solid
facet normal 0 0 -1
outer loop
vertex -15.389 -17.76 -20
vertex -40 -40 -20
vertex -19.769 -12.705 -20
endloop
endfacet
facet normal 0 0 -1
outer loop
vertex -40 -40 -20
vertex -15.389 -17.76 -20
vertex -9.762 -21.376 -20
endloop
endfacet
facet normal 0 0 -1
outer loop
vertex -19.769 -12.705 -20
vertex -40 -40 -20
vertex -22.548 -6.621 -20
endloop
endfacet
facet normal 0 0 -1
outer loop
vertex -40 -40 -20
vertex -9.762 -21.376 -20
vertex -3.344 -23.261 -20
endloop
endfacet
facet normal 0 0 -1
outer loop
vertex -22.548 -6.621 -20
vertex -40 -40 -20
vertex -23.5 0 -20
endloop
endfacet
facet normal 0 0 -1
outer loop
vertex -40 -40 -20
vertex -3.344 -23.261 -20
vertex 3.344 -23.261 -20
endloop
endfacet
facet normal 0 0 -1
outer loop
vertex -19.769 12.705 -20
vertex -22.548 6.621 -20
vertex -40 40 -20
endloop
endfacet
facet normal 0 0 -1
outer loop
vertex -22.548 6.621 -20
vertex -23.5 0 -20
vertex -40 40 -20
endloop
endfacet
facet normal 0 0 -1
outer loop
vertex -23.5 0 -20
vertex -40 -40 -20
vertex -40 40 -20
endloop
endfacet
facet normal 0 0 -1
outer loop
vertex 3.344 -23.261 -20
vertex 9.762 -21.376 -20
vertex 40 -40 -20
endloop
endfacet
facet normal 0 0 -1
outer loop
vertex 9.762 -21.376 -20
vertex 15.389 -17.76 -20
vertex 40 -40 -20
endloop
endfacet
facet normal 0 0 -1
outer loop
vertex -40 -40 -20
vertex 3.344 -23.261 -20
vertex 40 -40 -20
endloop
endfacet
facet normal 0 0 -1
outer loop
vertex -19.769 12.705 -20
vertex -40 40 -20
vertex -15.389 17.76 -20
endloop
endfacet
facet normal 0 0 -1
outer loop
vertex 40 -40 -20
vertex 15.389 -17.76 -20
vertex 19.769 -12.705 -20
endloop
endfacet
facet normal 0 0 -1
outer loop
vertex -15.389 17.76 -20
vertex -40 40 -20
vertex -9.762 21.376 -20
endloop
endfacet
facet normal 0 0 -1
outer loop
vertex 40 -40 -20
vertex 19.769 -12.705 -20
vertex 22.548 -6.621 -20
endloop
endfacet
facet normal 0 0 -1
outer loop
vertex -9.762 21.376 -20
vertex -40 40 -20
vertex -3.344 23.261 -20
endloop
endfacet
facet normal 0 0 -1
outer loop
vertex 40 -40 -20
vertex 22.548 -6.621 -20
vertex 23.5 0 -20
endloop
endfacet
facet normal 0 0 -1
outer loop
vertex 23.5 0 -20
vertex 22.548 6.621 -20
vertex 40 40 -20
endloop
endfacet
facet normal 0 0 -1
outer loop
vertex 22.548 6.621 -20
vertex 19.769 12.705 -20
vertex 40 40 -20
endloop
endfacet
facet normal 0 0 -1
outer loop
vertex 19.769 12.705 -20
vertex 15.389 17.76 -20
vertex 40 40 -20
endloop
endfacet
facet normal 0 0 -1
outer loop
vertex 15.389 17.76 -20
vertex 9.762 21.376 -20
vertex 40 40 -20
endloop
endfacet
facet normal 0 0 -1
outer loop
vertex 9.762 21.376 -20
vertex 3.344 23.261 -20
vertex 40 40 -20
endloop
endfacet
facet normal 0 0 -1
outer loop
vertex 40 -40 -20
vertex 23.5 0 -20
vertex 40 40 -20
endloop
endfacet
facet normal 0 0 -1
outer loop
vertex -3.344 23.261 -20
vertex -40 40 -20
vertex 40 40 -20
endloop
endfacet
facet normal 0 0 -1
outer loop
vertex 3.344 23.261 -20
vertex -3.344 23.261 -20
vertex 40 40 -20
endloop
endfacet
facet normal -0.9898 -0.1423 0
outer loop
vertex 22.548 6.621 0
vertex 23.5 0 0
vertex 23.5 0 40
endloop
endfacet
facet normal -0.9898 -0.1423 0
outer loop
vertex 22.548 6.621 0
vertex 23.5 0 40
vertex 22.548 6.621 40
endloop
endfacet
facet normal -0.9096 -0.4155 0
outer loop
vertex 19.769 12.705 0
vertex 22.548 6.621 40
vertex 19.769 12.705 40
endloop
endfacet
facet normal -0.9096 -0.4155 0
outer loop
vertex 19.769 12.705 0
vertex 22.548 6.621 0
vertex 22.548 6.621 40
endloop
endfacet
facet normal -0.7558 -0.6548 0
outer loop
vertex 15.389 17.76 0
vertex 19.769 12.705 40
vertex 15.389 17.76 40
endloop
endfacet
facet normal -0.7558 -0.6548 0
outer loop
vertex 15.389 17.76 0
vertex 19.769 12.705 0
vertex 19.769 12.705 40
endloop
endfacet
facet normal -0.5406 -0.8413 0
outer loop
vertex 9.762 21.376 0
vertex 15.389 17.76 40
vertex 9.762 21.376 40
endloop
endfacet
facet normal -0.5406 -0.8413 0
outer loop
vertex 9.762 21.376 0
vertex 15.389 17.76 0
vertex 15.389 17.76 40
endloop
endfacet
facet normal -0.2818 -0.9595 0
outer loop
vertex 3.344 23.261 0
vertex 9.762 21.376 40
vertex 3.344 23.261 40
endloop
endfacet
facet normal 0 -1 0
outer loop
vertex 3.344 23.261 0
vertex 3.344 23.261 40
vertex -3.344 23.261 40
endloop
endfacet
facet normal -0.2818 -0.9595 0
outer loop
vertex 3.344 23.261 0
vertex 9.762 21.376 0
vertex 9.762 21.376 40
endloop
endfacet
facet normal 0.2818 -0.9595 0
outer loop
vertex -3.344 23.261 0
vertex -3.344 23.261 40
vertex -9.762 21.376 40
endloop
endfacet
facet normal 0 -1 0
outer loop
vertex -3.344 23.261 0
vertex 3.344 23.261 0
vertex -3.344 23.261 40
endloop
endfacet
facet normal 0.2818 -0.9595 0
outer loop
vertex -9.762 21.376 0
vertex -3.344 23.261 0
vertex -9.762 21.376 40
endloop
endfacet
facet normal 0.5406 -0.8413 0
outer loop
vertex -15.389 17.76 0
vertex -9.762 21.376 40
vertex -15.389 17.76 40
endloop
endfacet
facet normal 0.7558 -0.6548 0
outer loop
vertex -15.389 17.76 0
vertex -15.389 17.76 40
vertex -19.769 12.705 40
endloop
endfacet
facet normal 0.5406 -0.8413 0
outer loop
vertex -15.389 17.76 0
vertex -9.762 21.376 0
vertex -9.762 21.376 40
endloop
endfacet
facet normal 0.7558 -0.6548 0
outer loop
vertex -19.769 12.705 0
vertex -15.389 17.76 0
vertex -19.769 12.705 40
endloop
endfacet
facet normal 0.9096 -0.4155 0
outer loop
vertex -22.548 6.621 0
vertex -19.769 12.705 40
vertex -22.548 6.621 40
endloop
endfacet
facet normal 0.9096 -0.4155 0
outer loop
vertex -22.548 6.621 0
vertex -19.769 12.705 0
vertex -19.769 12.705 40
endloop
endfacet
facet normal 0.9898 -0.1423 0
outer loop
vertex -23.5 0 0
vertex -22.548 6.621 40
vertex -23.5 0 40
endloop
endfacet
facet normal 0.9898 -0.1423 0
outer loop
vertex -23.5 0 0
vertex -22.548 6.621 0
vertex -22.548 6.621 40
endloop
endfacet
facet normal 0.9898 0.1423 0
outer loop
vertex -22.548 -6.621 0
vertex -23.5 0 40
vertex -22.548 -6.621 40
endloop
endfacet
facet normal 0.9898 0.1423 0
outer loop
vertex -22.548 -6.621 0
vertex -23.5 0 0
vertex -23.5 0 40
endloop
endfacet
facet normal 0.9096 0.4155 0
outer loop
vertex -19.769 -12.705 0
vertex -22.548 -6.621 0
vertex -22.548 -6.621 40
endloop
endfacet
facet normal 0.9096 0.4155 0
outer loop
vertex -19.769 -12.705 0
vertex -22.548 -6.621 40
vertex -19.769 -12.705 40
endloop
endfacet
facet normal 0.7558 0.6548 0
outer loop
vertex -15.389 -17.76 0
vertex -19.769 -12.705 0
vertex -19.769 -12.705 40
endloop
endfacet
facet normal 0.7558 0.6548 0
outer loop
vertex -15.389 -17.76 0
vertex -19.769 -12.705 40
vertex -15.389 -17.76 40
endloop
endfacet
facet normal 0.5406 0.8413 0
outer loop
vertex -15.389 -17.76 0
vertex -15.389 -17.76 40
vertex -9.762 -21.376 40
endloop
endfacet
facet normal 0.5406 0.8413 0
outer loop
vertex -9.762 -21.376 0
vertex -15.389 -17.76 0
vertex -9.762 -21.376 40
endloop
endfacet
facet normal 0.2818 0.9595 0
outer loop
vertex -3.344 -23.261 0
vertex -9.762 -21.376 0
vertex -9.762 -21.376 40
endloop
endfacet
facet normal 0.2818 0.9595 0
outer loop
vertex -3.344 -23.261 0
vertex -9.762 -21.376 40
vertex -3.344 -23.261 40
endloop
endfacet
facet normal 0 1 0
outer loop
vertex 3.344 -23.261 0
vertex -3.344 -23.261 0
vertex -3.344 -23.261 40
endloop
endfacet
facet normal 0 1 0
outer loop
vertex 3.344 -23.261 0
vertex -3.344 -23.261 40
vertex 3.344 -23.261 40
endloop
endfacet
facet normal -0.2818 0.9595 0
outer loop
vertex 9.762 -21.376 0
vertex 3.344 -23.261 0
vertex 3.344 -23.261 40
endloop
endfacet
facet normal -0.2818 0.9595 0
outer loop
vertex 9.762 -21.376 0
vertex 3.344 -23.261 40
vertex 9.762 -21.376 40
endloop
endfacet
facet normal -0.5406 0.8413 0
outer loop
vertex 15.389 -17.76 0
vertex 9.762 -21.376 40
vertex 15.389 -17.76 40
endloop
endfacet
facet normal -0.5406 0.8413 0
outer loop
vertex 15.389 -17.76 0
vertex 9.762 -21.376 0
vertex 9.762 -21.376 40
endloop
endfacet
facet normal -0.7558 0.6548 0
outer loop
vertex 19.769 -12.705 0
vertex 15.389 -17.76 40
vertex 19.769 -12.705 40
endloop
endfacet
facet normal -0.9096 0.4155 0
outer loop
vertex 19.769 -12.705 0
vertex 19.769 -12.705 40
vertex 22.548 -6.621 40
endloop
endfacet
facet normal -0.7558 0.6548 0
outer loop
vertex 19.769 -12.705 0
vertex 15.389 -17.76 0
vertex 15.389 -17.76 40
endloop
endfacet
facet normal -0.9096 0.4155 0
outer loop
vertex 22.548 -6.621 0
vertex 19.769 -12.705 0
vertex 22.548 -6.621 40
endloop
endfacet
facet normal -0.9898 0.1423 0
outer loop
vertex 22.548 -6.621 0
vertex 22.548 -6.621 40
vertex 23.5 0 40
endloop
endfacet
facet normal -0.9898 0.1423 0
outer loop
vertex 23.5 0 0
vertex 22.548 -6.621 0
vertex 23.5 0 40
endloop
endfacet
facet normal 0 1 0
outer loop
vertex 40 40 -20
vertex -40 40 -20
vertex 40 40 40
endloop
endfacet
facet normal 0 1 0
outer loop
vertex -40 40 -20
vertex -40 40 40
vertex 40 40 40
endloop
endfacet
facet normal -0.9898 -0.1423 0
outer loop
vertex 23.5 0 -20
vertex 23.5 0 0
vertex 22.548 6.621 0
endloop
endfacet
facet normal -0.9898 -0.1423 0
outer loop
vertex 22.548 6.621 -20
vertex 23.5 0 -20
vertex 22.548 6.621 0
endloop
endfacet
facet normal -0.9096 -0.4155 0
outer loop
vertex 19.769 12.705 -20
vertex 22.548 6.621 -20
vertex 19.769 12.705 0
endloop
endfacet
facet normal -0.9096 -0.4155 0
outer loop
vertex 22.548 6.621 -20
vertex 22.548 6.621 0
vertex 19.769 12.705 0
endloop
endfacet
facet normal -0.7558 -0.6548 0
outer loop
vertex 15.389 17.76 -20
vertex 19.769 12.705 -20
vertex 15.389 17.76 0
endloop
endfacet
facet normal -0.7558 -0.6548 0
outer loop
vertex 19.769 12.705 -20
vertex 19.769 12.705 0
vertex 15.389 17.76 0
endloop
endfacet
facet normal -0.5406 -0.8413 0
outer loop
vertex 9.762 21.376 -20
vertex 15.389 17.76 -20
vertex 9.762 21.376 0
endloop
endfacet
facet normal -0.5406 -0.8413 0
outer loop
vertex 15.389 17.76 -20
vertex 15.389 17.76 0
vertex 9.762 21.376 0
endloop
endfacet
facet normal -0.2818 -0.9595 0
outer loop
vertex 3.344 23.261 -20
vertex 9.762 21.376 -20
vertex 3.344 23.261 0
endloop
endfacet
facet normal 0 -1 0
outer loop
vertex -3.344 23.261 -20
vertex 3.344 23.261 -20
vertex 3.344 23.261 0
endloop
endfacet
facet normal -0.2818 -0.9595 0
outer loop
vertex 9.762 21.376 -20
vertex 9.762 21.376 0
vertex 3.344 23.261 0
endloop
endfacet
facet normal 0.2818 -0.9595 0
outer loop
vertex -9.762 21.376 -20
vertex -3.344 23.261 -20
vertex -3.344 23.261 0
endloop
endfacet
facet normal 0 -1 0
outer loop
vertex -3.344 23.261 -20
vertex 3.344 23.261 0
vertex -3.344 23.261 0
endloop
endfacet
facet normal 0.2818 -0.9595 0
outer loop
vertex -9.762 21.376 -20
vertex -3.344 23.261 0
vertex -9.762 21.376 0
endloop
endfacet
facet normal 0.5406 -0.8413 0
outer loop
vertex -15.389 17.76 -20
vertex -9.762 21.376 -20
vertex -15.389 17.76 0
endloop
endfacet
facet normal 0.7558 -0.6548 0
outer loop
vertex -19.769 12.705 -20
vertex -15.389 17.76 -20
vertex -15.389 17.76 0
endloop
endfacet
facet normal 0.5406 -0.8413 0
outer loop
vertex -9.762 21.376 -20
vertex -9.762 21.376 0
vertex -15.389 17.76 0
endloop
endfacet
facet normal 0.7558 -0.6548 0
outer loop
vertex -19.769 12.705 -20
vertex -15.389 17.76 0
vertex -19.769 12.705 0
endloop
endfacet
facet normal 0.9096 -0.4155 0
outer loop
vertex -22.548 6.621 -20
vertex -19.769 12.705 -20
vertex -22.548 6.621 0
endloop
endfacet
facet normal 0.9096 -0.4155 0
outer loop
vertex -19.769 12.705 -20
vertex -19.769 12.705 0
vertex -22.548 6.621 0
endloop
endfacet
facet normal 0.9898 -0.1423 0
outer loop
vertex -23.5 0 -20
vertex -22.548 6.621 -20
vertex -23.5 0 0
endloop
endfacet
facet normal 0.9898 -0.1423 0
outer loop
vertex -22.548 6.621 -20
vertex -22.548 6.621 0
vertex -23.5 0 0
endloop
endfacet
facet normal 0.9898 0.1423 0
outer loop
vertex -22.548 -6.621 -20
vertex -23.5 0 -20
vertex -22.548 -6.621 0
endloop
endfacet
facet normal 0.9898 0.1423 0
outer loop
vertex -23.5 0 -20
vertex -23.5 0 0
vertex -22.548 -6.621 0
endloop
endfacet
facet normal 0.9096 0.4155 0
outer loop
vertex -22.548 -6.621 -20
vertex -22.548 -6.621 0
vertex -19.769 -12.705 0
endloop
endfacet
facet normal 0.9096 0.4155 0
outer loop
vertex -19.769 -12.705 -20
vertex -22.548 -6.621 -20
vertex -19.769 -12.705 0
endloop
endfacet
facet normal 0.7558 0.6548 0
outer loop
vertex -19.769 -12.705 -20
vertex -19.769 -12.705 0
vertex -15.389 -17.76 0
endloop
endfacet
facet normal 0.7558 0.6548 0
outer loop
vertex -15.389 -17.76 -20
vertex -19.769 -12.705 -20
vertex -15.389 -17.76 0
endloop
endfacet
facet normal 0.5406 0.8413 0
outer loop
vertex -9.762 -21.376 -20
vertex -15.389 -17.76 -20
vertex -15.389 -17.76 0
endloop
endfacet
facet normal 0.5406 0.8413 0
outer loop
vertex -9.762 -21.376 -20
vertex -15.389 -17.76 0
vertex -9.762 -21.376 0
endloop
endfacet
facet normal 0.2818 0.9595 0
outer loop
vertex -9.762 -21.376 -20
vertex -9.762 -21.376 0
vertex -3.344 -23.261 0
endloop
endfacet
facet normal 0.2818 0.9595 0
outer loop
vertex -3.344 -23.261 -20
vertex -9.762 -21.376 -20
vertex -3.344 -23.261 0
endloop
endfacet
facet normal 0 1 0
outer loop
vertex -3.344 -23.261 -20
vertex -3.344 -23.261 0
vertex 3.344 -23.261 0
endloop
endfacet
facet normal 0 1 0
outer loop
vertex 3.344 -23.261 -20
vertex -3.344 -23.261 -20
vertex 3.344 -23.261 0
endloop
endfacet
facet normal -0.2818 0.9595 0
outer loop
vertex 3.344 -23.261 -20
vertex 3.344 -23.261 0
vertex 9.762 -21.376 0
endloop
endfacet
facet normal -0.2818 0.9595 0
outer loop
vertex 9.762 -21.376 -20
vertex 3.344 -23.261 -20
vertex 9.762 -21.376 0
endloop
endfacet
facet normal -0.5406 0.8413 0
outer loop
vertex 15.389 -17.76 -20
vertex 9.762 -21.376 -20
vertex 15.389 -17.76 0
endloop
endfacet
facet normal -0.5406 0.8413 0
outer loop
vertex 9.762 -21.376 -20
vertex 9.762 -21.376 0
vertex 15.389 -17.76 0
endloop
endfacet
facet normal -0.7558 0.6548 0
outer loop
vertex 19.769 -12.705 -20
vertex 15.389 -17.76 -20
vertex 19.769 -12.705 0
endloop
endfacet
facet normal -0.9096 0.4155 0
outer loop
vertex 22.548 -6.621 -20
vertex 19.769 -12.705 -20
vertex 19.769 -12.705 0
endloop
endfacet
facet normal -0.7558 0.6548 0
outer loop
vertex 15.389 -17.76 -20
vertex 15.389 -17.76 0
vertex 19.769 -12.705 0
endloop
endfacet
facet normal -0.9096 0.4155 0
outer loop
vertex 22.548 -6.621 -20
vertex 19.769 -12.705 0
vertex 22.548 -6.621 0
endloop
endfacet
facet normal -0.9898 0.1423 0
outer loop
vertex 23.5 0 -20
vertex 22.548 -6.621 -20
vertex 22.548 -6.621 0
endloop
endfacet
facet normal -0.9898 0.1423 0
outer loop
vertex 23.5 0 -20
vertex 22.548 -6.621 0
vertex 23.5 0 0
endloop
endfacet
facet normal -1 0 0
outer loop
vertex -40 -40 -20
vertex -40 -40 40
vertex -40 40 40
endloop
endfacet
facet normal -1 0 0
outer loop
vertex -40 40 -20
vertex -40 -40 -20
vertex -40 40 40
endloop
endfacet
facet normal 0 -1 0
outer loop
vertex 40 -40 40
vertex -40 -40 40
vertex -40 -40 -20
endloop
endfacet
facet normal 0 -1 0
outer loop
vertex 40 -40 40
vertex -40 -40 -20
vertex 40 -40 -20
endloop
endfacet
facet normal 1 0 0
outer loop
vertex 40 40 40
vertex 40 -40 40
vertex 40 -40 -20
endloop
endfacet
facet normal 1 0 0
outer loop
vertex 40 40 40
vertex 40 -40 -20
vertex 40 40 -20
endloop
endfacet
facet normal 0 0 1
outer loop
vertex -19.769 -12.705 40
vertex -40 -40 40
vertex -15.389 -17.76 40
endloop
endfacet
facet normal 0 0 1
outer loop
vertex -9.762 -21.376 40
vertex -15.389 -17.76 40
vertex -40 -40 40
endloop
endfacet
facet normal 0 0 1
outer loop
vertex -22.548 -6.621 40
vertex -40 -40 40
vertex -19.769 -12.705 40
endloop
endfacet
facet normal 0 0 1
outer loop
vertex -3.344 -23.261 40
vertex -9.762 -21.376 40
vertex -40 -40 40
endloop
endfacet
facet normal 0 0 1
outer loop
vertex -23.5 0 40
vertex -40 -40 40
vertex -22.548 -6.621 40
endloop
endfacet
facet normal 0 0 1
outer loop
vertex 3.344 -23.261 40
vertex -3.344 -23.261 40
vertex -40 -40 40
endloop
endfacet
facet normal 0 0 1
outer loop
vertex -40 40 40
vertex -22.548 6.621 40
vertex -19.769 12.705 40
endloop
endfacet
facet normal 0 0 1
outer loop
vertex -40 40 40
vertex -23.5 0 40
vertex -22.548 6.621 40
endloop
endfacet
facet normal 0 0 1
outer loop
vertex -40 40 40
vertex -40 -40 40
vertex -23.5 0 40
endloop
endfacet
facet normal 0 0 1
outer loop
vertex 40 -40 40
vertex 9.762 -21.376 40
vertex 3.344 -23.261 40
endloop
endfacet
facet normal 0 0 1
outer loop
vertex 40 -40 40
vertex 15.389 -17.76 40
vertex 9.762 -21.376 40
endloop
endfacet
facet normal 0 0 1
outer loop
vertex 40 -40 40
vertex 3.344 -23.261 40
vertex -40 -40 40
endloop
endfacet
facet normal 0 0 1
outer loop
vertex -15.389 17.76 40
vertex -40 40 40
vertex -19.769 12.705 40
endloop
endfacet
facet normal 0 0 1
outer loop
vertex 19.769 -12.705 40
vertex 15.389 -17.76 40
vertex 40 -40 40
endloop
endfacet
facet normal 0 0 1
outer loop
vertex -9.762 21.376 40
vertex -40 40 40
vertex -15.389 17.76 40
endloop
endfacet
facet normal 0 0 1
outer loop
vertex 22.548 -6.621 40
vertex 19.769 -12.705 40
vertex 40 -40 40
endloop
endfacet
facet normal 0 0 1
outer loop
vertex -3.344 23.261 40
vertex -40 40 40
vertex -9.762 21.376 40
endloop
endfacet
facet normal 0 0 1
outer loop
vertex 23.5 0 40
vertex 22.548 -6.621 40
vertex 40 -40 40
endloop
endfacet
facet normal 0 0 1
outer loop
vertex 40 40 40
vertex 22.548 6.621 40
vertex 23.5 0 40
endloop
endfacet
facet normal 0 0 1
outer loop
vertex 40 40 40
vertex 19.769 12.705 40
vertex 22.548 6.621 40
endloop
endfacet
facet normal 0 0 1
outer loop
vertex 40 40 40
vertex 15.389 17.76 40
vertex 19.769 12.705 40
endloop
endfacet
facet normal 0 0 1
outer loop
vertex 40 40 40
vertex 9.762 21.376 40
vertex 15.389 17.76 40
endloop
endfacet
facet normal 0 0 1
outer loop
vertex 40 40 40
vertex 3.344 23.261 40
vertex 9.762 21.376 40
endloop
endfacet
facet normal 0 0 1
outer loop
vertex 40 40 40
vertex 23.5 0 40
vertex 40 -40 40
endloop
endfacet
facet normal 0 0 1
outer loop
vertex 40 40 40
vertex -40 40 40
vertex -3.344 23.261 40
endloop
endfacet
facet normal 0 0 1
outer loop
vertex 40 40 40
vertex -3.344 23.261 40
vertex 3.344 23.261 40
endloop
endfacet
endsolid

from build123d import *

# Parameters (mm, degrees)
F0_W          = 80
F0_H          = 80
F0_R          = 23.5
F1_DEPTH      = 40
F1_DEPTH_BACK = 20


with BuildPart() as f1:
    # F0 (on Top) → F1 (new body, two sides)
    with BuildSketch(Plane.XY) as f1_sk:
        Rectangle(F0_W, F0_H)
        Circle(F0_R, mode=Mode.SUBTRACT)
    extrude(amount=F1_DEPTH)
    extrude(f1_sk.sketch, amount=-F1_DEPTH_BACK)


solid = f1.part
